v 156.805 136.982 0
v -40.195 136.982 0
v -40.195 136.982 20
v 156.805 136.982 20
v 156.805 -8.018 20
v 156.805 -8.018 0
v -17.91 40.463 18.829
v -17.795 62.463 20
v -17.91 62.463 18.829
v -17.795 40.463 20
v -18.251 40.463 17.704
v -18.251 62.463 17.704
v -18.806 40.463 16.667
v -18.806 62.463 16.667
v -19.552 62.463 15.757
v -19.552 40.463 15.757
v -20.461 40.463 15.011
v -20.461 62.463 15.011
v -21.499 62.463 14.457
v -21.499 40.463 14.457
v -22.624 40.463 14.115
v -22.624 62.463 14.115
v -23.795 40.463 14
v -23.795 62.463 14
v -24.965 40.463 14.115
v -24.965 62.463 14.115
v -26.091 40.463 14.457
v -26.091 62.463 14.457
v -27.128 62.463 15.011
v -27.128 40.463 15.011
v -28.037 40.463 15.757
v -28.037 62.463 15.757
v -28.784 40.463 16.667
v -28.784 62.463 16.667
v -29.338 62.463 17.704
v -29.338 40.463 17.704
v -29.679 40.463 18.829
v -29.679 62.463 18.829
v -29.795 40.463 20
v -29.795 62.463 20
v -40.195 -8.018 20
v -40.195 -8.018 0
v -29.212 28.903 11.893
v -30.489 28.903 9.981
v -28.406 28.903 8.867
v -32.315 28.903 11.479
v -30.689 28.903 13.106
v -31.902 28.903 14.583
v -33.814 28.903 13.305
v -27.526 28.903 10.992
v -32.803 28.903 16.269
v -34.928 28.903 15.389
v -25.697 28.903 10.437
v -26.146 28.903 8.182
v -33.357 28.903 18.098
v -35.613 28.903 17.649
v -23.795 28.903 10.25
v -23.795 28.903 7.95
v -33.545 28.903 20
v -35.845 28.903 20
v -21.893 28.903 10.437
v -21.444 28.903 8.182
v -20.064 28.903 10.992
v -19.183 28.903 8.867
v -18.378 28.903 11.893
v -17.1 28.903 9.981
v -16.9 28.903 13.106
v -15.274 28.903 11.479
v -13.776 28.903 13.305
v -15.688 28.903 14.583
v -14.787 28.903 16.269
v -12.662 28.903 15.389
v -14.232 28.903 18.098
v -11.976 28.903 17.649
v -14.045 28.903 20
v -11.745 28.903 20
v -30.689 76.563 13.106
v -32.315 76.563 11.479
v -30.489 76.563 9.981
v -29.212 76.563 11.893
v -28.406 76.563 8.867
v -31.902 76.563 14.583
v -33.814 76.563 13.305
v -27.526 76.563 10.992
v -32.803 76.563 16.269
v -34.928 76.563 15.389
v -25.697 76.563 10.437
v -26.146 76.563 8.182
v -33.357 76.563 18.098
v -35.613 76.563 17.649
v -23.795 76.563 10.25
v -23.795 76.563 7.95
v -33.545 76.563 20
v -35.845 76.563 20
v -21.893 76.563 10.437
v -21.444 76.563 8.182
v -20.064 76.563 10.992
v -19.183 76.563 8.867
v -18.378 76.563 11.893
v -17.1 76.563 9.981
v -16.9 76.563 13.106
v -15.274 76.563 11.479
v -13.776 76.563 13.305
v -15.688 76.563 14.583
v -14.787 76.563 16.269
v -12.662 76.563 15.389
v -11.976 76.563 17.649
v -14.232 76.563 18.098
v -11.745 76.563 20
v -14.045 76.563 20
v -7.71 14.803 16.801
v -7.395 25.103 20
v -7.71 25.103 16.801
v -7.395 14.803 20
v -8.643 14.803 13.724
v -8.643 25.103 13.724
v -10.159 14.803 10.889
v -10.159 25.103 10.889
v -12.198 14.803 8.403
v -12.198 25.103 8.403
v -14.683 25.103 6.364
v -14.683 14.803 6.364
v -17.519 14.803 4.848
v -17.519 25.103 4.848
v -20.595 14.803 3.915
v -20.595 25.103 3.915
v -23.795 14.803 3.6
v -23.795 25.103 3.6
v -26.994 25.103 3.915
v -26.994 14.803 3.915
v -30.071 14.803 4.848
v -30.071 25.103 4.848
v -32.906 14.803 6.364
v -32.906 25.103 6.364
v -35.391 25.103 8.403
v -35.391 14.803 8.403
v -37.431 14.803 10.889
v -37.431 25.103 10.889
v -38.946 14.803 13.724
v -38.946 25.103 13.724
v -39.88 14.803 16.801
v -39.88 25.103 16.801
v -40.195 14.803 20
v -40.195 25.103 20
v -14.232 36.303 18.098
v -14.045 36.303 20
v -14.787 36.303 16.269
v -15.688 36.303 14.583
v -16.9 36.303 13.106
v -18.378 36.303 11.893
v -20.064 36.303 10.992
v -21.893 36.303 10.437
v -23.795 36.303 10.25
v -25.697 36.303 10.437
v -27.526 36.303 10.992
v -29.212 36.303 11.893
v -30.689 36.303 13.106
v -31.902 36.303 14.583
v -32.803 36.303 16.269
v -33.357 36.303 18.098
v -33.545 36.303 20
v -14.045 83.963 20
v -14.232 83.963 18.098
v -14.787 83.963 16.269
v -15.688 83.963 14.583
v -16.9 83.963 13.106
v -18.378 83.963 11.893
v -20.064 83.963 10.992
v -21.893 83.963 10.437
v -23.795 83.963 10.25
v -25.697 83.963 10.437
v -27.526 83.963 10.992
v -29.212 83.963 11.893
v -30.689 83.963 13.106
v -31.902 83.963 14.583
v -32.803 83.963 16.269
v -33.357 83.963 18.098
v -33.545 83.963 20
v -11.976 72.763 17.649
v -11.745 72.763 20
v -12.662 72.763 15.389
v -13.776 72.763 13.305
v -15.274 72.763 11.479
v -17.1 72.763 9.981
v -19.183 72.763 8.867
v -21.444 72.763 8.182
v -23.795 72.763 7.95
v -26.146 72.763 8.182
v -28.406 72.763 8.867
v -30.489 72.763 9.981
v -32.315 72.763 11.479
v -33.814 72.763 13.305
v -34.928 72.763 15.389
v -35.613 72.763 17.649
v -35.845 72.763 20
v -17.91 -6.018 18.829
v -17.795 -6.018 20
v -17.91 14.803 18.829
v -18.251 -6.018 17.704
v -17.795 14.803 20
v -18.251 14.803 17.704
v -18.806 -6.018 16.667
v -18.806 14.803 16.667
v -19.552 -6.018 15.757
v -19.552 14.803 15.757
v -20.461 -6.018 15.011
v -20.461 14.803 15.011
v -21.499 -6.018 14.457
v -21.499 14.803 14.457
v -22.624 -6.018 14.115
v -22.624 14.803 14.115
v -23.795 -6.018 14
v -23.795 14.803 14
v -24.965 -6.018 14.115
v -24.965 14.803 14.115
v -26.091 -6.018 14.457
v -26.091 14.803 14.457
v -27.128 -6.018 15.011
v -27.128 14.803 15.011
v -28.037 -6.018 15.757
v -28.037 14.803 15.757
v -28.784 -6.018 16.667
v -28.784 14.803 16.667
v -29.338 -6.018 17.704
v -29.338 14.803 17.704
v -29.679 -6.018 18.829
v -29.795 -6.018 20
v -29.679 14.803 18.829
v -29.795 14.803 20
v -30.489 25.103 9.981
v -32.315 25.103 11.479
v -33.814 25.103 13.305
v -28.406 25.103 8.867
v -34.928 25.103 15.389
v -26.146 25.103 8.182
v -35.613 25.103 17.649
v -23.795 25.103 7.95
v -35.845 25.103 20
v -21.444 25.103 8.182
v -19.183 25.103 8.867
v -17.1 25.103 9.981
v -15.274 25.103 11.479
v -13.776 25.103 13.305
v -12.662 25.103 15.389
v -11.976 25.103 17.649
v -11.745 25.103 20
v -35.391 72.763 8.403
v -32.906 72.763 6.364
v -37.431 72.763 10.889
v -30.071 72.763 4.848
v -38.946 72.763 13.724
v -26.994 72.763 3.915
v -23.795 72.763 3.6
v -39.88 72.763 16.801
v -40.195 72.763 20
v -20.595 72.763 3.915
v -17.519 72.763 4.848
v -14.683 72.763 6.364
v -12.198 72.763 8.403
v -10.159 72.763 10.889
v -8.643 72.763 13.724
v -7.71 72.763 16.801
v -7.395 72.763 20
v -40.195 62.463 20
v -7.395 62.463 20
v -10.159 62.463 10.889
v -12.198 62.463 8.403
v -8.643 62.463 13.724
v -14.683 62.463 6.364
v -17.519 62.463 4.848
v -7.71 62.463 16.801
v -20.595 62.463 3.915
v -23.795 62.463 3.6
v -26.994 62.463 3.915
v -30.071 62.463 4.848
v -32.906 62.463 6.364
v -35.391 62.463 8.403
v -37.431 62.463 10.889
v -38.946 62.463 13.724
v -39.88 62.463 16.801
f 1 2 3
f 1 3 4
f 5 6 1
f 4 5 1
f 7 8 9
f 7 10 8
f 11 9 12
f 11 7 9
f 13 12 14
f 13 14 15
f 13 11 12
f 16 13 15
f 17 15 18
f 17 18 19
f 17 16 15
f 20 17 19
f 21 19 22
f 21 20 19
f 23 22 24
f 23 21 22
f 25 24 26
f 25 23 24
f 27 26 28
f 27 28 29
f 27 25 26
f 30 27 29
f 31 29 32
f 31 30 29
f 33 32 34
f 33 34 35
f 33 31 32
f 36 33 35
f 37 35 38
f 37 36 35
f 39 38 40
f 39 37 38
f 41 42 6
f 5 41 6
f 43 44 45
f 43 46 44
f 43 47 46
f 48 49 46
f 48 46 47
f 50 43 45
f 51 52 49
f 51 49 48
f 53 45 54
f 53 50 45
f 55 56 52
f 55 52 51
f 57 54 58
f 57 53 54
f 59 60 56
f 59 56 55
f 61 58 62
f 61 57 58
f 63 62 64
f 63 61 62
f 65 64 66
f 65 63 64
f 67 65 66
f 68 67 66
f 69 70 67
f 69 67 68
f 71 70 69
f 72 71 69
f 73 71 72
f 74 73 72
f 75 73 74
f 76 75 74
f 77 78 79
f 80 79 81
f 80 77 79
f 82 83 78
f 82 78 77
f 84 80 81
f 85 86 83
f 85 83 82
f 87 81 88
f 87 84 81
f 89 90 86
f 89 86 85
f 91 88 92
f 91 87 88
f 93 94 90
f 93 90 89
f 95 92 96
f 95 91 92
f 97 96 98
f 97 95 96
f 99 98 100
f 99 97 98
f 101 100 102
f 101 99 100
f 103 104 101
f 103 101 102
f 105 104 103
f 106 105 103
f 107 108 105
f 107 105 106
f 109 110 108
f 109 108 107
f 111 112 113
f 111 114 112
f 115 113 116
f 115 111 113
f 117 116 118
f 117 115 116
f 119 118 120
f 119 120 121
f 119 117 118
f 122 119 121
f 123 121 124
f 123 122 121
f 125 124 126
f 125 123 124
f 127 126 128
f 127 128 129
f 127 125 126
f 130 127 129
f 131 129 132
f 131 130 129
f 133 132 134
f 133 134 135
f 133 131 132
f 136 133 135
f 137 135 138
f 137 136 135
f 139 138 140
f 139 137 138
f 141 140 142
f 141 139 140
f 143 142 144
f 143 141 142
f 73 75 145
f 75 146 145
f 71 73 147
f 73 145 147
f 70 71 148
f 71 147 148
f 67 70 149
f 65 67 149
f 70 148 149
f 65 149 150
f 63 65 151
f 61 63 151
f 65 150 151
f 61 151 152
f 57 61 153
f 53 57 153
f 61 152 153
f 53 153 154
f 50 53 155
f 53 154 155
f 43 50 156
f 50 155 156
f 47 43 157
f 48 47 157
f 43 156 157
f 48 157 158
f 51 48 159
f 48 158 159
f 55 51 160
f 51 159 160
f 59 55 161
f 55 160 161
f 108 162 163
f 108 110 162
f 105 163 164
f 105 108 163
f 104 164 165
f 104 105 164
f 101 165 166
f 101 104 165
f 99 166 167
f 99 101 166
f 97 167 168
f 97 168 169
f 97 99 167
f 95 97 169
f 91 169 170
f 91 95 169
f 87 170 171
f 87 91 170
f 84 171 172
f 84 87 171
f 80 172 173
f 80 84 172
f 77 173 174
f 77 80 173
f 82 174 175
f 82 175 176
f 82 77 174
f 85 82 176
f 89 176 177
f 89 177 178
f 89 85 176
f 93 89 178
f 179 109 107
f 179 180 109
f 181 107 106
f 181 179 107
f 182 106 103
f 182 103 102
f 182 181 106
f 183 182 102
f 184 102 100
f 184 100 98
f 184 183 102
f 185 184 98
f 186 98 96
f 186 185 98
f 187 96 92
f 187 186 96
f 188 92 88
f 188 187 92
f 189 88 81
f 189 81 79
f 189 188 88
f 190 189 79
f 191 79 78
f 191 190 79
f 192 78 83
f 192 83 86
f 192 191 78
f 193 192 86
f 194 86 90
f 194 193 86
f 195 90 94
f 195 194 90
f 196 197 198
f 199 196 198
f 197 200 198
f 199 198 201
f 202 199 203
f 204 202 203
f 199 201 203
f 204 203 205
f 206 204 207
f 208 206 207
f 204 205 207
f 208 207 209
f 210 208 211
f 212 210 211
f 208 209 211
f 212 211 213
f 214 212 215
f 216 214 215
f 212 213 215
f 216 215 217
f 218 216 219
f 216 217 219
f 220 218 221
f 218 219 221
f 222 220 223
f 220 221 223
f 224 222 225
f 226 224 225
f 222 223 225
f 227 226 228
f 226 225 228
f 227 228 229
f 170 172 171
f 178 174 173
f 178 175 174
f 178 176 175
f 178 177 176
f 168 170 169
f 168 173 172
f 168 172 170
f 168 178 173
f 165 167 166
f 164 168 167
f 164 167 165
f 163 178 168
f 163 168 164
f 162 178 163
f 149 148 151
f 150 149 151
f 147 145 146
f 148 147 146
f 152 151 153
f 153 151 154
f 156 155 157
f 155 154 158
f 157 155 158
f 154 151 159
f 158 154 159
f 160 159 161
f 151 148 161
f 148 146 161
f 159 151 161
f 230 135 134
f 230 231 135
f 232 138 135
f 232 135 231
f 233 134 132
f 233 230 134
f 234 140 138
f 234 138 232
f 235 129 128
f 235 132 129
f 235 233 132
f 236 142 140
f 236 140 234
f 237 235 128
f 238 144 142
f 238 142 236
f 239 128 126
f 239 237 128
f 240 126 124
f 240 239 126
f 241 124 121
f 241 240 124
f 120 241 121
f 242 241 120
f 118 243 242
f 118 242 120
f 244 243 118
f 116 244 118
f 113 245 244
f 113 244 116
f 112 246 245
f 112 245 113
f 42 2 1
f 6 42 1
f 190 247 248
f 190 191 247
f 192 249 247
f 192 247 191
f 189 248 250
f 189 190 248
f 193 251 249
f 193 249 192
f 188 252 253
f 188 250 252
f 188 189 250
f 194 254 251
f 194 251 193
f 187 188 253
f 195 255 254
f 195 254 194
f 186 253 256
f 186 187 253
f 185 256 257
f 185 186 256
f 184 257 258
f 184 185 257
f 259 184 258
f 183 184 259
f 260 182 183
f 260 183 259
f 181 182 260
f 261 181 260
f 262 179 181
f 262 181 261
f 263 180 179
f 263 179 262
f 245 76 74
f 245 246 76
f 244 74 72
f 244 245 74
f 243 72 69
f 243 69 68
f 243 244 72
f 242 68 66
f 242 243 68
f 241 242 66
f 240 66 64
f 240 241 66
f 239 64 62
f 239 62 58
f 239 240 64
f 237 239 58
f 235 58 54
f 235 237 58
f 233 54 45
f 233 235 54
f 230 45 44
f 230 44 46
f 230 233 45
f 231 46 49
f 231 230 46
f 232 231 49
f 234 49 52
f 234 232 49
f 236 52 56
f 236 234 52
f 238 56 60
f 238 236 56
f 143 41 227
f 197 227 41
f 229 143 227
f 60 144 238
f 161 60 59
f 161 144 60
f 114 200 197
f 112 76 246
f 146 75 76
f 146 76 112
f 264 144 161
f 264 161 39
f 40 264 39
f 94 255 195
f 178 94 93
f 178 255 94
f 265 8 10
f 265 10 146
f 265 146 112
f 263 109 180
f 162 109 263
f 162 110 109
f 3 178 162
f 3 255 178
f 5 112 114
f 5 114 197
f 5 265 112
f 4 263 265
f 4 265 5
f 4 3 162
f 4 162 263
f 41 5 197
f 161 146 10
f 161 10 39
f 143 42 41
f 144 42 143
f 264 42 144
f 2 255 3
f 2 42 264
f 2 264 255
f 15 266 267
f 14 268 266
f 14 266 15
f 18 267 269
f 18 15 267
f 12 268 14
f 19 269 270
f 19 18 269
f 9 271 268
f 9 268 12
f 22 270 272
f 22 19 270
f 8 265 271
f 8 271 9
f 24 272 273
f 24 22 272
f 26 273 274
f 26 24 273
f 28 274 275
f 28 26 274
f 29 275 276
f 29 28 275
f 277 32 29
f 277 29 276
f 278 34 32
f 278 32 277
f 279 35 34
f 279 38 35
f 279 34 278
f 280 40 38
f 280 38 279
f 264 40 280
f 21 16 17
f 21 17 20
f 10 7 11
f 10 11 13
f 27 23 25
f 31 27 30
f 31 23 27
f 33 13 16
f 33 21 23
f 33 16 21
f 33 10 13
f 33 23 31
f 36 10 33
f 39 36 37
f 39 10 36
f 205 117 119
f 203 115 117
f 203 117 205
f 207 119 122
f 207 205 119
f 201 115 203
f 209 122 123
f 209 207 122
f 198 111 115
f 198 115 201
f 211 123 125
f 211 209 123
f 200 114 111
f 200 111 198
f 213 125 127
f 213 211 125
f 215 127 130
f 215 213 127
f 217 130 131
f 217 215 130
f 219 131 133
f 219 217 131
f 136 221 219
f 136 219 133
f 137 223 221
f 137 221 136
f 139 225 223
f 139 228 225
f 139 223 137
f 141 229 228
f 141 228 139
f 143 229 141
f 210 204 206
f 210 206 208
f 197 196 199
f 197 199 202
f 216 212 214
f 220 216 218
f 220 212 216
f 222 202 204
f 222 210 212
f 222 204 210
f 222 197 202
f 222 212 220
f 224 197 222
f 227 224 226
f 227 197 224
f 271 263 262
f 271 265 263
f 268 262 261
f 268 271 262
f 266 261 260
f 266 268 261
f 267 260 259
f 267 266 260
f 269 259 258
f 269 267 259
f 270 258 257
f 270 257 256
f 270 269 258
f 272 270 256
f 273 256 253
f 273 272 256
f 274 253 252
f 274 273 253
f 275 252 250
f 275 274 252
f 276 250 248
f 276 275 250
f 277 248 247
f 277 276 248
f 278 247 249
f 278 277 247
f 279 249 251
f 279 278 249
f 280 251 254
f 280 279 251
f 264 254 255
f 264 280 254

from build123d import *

# Parameters (mm, degrees)
F0_W     = 197
F0_H     = 145
F1_DEPTH = 20
F2_W     = 6
F2_H     = 20.820669
F2_W_2   = 9.75
F2_H_2   = 7.4


with BuildPart() as f1:
    # F0 (on Top) → F1 (new body)
    with BuildSketch(Plane.XY):
        with Locations((58.305234, 64.482138)):
            Rectangle(F0_W, F0_H)
    extrude(amount=F1_DEPTH)

    # F2 (on face) → F3 (revolve, cut)
    with BuildSketch(Plane.XY.offset(20)):
        with Locations((-26.794766, 4.392473)):
            Rectangle(F2_W, F2_H)
        Polygon((-29.794766, 14.802807), (-23.794766, 14.802807), (-23.794766, 25.102807), (-35.844766, 25.102807), (-40.194766, 25.102807), (-40.194766, 14.802807), align=None)
        Polygon((-35.844766, 25.102807), (-23.794766, 25.102807), (-23.794766, 28.902807), (-33.544766, 28.902807), (-35.844766, 28.902807), align=None)
        with Locations((-28.669766, 32.602807)):
            Rectangle(F2_W_2, F2_H_2)
        Polygon((-29.794766, 40.462807), (-23.794766, 40.462807), (-23.794766, 83.962807), (-33.544766, 83.962807), (-33.544766, 76.562807), (-35.844766, 76.562807), (-35.844766, 72.762807), (-40.194766, 72.762807), (-40.194766, 62.462807), (-29.794766, 62.462807), align=None)
    revolve(axis=Axis((-23.794766, 19.952807, 20), (0, 1, 0)), mode=Mode.SUBTRACT)


solid = f1.part
